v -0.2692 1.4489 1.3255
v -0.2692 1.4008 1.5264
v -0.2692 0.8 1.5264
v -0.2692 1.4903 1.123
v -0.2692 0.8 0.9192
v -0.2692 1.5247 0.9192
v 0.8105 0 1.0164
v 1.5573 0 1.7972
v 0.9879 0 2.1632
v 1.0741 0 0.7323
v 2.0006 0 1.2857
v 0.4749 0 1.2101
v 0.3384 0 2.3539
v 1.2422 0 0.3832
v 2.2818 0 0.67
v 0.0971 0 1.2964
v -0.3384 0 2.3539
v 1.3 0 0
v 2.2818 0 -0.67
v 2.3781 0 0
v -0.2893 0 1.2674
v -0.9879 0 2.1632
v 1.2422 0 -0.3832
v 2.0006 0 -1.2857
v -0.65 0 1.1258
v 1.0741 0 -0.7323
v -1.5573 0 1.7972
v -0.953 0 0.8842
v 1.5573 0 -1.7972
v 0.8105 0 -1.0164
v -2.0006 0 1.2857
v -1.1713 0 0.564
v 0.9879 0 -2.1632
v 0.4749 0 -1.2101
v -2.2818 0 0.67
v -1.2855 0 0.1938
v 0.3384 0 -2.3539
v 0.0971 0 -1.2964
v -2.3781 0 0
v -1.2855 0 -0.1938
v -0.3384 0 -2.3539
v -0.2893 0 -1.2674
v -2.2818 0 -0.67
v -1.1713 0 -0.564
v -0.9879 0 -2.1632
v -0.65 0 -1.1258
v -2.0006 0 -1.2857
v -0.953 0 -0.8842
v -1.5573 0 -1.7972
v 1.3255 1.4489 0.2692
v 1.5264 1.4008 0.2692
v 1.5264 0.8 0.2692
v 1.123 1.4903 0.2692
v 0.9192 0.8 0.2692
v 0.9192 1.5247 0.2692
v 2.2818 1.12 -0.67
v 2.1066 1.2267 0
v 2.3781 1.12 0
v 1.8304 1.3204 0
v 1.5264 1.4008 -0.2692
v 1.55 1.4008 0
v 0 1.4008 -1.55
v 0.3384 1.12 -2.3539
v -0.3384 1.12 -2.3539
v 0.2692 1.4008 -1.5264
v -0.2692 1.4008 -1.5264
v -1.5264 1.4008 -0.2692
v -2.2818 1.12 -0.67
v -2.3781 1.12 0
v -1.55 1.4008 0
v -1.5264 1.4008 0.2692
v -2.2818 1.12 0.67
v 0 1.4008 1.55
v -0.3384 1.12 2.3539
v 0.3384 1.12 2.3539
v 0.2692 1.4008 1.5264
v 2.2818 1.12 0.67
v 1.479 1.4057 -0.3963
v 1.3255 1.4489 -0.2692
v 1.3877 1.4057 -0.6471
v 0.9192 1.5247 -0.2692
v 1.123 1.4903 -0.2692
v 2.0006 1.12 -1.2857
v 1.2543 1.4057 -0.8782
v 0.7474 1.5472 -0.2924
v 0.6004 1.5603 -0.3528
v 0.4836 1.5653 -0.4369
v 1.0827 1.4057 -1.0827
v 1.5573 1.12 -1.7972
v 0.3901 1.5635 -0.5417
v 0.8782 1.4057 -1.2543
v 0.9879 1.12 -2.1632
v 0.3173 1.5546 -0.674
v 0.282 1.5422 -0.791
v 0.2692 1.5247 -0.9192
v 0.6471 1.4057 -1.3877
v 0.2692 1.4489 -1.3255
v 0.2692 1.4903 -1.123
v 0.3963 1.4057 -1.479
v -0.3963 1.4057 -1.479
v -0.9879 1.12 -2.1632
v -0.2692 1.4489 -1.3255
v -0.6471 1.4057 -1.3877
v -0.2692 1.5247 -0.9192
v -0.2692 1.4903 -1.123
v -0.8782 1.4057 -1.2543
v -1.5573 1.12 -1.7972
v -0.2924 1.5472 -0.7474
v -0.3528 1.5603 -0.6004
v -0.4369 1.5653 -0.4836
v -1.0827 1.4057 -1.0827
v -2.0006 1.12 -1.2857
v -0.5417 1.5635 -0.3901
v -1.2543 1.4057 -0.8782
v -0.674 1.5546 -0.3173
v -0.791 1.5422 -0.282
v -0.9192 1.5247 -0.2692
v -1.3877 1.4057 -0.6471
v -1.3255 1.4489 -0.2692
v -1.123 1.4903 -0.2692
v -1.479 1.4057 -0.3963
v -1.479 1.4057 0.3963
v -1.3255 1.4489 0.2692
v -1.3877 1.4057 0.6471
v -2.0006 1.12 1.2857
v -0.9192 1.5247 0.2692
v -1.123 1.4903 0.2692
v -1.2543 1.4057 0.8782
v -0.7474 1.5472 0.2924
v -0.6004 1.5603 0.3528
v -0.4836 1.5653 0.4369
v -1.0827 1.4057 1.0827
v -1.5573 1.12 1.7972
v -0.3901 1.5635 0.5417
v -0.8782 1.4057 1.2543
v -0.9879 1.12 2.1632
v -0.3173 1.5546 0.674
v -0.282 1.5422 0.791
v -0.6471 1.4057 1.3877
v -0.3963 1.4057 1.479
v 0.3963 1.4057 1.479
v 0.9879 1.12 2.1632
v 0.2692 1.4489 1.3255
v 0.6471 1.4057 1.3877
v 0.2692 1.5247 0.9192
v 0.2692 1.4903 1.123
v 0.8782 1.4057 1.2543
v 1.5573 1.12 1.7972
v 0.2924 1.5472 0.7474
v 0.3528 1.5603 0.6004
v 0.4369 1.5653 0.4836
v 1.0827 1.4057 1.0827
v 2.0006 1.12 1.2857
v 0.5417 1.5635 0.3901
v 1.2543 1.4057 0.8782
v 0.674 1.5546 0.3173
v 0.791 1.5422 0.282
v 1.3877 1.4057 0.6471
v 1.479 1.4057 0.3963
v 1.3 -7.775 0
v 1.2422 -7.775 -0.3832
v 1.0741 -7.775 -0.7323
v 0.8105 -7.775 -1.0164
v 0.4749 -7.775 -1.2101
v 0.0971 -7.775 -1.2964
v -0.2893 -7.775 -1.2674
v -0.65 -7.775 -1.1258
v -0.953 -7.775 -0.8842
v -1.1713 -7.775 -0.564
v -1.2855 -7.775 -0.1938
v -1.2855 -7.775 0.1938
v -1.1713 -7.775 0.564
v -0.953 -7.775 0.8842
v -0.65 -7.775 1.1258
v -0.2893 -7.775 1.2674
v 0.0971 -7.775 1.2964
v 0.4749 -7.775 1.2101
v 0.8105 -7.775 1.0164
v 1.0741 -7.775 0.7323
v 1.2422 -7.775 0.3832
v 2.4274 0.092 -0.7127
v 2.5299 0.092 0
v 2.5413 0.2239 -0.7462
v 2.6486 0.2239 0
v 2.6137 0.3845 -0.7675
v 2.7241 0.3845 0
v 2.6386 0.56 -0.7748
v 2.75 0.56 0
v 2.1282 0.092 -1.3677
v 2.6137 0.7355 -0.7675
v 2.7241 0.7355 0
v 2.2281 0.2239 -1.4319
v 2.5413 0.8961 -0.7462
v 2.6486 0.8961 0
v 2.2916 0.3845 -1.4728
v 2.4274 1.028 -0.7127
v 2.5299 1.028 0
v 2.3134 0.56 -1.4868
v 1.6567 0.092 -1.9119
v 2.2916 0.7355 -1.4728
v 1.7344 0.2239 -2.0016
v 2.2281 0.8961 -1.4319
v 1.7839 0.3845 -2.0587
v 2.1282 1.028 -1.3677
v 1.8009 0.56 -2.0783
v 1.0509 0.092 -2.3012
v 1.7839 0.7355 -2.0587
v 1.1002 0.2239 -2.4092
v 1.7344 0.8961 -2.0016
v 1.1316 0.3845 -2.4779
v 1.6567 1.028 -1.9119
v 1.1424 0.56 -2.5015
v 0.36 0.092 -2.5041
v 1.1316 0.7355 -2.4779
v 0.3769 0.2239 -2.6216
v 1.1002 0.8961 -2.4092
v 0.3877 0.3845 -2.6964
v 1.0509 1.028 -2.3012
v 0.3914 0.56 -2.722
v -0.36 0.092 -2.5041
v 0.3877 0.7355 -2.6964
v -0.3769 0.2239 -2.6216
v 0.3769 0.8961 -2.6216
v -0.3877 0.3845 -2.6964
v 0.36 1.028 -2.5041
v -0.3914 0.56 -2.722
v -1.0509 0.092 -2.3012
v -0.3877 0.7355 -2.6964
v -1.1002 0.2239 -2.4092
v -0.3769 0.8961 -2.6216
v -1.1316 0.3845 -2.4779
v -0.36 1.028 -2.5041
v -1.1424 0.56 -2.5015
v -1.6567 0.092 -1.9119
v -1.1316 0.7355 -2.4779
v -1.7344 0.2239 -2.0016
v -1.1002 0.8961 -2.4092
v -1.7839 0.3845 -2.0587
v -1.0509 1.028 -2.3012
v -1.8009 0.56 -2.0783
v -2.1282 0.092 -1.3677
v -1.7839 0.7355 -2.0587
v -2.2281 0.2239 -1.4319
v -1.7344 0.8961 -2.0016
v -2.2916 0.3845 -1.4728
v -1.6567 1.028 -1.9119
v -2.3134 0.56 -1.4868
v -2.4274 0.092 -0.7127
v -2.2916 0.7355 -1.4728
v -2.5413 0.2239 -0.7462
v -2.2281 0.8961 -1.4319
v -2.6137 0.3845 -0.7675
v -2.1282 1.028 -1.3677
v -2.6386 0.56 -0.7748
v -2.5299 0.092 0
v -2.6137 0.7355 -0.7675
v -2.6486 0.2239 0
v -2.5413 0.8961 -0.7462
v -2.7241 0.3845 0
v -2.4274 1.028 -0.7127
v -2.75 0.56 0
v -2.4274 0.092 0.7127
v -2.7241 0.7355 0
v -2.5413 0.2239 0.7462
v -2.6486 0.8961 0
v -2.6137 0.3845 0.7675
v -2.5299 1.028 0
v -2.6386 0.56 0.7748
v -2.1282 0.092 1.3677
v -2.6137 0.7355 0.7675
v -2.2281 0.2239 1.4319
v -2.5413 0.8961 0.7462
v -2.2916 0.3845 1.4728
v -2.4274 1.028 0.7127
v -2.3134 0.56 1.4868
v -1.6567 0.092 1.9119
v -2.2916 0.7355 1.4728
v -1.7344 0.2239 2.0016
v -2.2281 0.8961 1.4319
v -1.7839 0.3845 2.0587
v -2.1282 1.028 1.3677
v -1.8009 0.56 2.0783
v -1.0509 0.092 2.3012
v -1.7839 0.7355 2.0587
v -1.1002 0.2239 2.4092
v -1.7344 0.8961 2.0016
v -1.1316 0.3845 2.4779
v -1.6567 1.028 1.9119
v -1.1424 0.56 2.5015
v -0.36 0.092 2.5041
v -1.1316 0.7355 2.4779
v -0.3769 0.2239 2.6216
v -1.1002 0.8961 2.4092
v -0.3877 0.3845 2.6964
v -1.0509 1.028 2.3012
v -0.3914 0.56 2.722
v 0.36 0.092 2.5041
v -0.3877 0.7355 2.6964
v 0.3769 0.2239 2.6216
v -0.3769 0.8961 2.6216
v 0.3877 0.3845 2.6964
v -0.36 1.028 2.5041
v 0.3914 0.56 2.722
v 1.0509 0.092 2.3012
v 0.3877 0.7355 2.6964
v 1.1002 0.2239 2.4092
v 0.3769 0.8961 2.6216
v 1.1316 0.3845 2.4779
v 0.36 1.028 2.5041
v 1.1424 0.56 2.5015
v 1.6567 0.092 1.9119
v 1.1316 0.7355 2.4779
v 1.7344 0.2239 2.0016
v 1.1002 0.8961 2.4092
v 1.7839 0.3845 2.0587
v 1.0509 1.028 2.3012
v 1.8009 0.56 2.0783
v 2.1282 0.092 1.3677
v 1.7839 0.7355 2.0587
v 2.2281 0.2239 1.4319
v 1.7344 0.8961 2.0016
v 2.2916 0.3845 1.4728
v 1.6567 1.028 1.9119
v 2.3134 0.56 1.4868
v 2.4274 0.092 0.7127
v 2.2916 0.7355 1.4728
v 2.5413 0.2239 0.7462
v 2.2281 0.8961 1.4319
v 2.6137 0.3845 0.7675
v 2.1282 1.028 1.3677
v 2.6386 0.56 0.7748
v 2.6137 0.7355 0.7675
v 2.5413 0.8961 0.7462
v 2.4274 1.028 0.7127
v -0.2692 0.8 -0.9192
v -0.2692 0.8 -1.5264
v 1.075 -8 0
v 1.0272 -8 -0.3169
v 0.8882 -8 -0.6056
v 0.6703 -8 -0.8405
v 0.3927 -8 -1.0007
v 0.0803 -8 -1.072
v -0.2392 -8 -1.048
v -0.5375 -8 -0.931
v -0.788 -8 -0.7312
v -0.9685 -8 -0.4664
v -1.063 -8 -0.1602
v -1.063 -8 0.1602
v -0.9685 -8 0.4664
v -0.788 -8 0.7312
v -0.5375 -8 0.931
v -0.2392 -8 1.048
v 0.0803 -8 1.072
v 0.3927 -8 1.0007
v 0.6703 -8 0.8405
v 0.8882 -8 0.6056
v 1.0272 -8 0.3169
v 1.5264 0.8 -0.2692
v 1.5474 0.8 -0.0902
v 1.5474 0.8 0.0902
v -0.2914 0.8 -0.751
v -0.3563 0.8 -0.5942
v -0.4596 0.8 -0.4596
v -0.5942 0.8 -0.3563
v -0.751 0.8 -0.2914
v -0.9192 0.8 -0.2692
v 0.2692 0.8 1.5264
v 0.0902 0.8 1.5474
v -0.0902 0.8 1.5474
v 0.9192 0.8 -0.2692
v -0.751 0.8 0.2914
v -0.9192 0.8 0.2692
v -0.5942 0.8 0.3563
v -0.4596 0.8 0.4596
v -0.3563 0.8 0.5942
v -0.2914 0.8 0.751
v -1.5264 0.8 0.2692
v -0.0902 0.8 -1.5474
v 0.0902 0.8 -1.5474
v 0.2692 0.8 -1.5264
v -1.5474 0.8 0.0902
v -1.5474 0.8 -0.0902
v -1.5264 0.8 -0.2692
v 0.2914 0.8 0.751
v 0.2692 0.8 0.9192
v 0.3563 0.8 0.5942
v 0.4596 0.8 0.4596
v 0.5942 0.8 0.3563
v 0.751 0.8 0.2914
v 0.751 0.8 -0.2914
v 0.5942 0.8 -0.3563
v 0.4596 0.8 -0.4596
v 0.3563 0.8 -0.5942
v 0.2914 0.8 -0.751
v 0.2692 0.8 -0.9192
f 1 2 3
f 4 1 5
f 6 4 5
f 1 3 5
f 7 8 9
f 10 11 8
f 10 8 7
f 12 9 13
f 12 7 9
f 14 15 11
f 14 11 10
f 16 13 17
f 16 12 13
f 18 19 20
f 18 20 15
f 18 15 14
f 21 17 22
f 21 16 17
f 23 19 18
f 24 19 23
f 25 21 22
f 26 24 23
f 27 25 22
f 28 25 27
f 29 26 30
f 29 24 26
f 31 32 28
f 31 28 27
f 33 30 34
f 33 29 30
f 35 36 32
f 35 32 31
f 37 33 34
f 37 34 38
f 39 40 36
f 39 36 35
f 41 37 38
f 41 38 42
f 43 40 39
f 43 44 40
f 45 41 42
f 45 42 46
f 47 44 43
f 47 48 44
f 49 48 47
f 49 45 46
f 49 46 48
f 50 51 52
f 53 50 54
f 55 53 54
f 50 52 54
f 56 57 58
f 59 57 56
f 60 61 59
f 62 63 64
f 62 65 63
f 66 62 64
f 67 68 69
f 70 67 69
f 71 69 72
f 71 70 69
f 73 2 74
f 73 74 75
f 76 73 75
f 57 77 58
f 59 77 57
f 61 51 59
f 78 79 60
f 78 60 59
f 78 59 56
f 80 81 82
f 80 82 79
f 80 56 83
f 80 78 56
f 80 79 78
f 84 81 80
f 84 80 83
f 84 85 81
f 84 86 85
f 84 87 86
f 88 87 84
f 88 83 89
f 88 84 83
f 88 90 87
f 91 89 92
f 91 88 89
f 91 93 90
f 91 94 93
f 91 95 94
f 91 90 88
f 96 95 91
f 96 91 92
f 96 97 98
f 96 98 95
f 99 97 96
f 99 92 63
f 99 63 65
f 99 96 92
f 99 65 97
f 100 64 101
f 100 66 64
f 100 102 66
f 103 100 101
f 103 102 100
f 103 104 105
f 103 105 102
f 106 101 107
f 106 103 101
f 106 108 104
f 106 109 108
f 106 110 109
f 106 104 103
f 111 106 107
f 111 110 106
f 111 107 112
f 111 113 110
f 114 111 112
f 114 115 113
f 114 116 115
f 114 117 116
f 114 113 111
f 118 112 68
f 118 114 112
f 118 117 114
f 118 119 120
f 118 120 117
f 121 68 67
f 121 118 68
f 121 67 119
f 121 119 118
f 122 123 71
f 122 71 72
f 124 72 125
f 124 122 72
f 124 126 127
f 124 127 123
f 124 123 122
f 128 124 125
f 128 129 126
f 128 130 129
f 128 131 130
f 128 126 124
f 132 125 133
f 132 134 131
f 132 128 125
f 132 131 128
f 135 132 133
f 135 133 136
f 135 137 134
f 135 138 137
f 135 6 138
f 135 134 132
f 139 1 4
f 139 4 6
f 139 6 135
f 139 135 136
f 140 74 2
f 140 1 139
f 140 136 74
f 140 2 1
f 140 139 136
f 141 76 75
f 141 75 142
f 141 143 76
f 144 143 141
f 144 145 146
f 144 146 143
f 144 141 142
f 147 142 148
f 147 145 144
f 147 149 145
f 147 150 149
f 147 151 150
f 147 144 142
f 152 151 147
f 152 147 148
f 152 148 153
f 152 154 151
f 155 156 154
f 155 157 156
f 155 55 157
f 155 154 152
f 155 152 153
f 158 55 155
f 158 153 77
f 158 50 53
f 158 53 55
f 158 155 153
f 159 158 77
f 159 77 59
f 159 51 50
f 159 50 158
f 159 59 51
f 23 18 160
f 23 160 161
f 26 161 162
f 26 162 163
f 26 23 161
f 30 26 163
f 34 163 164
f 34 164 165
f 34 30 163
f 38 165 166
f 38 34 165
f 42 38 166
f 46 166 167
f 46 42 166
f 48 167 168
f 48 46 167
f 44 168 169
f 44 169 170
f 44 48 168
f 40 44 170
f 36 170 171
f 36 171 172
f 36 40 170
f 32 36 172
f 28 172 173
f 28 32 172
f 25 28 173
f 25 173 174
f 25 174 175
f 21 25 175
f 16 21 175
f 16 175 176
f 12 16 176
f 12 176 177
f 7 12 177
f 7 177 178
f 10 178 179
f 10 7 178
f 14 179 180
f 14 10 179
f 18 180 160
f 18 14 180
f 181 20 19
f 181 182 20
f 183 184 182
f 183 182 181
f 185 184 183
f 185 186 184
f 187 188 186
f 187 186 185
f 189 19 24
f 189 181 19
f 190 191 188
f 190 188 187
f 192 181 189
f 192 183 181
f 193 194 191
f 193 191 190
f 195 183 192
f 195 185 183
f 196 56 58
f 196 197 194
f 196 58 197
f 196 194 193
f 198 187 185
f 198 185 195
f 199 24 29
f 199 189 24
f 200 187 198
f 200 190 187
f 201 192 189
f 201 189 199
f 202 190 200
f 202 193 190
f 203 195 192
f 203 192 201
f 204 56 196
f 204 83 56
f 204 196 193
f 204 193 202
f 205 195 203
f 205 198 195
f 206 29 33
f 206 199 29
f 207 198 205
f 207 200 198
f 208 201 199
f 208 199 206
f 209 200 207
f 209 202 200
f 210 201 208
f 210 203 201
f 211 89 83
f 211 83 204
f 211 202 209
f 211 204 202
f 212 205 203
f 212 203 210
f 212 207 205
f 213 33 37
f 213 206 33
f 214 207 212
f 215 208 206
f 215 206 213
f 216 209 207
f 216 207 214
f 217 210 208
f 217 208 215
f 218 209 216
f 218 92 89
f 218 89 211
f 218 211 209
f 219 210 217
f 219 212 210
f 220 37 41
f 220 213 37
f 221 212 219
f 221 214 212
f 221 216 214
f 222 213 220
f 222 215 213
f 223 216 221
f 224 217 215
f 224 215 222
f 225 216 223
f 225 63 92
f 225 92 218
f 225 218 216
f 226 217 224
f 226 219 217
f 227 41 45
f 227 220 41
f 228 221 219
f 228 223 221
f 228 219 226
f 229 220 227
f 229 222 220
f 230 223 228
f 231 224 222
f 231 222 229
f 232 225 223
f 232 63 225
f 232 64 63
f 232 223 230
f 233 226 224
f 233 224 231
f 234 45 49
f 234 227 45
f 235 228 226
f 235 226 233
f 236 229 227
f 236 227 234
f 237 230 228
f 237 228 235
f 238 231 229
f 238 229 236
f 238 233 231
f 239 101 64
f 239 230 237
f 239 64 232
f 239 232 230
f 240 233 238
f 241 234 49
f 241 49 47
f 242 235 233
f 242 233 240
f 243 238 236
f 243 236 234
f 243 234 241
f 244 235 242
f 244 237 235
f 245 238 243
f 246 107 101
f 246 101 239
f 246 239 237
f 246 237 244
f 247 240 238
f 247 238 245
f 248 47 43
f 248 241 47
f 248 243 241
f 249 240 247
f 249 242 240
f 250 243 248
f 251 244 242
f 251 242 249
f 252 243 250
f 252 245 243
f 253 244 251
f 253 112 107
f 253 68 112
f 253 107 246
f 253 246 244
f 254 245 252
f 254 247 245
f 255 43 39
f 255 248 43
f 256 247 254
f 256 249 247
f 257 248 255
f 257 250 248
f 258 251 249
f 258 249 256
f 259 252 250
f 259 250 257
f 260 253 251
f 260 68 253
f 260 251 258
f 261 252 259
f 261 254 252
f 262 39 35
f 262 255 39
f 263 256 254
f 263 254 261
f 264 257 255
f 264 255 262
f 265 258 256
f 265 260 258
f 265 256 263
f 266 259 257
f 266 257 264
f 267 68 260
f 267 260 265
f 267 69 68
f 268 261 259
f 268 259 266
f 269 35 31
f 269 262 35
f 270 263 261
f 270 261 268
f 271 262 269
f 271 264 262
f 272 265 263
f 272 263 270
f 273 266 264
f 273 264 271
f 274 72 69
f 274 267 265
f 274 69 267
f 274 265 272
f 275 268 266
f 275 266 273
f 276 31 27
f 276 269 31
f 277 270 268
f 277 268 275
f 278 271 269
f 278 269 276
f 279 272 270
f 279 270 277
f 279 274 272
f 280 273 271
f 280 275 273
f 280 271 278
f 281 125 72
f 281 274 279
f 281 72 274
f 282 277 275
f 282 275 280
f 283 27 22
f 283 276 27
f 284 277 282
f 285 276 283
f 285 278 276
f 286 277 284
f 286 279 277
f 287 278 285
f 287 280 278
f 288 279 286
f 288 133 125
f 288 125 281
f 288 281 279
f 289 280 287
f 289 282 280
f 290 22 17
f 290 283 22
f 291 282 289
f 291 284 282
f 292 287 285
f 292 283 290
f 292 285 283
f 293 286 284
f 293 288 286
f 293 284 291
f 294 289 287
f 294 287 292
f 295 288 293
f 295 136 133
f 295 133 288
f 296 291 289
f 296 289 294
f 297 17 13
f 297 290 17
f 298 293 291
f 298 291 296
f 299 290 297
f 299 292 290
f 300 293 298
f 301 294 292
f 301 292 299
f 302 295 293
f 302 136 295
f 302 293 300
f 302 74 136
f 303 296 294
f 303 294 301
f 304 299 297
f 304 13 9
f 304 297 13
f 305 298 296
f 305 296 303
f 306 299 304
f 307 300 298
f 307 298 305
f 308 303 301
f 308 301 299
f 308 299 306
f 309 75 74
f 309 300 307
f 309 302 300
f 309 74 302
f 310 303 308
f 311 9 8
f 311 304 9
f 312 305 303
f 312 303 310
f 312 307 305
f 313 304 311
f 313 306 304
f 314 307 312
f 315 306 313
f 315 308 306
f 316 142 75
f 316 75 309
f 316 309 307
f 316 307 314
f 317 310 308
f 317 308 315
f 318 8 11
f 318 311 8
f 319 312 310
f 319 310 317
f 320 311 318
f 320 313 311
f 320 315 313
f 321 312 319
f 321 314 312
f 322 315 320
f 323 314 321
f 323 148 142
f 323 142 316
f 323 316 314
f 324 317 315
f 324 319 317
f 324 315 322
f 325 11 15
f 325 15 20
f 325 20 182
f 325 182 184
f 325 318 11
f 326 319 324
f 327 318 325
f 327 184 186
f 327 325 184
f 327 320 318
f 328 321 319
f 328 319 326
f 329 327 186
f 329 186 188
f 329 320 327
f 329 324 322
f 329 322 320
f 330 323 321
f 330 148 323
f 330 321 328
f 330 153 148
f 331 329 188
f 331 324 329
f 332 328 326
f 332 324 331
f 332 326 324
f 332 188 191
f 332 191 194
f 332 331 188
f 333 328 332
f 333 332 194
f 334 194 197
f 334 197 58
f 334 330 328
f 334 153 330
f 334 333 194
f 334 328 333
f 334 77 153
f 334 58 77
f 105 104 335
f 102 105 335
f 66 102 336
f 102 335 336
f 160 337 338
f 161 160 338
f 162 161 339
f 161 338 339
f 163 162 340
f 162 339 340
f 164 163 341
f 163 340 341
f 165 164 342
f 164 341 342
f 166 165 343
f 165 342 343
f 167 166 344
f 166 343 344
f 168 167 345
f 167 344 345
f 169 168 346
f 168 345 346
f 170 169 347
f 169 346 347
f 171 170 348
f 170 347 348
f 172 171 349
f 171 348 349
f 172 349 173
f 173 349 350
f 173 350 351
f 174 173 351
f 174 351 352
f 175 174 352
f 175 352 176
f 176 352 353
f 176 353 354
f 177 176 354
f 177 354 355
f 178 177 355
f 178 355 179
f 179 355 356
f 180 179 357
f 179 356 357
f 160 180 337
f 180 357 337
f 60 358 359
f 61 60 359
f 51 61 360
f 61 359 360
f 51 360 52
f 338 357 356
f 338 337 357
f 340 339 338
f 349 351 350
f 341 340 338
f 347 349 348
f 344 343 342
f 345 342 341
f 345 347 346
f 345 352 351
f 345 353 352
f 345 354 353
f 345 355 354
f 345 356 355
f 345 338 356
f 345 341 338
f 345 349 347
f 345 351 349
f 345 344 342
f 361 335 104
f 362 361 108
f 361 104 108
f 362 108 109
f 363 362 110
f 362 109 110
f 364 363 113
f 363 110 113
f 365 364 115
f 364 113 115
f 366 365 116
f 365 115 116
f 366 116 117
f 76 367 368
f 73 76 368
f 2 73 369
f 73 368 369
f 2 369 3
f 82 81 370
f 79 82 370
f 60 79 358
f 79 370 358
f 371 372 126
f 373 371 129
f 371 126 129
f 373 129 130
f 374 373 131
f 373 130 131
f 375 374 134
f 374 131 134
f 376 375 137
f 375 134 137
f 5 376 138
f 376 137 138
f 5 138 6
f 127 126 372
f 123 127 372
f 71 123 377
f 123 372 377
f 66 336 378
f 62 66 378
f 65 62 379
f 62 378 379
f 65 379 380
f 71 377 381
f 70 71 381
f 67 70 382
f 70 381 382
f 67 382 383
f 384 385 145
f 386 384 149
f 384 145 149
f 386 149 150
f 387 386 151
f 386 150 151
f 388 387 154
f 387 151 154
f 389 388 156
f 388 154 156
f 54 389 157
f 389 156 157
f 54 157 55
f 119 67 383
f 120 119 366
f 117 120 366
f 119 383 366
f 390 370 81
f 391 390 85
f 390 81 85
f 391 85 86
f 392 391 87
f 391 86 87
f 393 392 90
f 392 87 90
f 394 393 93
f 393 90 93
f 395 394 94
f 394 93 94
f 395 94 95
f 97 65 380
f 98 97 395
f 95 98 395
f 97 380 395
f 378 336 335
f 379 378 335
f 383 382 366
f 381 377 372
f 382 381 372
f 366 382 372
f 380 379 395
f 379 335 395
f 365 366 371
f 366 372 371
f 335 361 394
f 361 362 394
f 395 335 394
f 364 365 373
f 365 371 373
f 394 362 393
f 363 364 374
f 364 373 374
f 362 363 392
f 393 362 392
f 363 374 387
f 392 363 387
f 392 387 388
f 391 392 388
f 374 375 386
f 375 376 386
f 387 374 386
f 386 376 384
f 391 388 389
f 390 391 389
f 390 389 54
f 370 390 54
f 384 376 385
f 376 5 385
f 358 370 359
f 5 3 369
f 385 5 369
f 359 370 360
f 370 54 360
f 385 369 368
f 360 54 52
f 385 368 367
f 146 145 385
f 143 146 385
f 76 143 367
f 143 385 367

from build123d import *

# Parameters (mm, degrees)
CUT_EXTRUDE1_REACH = 11.621
CHAMFER1_SIZE      = 0.225
FILLET1_R          = 0.65


with BuildPart() as part:
    # Boss-Extrude1: read off the stored shape, not the designer's step
    # Boss-Extrude1 outline → Boss-Extrude1 (revolve)
    with BuildSketch(Plane.XY):
        with BuildLine():
            ThreePointArc((2.378097174, 1.12), (1.213027841, 1.478802074), (0, 1.6))
            Line((0, 1.6), (0, -8))
            Line((0, -8), (1.3, -8))
            Line((1.3, -8), (1.3, 0))
            Line((1.3, 0), (2.378097174, 0))
            ThreePointArc((2.378097174, 0), (2.75, 0.56), (2.378097174, 1.12))
        make_face()
    revolve(axis=Axis((0, 0, 0), (0, 1, 0)))

    # Sketch2 → Cut-Extrude1 (cut, up to next)
    with BuildSketch(Plane.XZ.offset(-0.8), mode=Mode.PRIVATE) as cut_extrude1_sk1:
        with BuildLine():
            Line((-0.269238816, 1.526437179), (-0.269238816, 0.269238816))
            Line((-0.269238816, 0.269238816), (-1.526437179, 0.269238816))
            ThreePointArc((-1.526437179, 0.269238816), (-1.55, 0), (-1.526437179, -0.269238816))
            Line((-1.526437179, -0.269238816), (-0.269238816, -0.269238816))
            Line((-0.269238816, -0.269238816), (-0.269238816, -1.526437179))
            ThreePointArc((-0.269238816, -1.526437179), (0, -1.55), (0.269238816, -1.526437179))
            Line((0.269238816, -1.526437179), (0.269238816, -0.269238816))
            Line((0.269238816, -0.269238816), (1.526437179, -0.269238816))
            ThreePointArc((1.526437179, -0.269238816), (1.55, 0), (1.526437179, 0.269238816))
            Line((1.526437179, 0.269238816), (0.269238816, 0.269238816))
            Line((0.269238816, 0.269238816), (0.269238816, 1.526437179))
            ThreePointArc((0.269238816, 1.526437179), (0, 1.55), (-0.269238816, 1.526437179))
        make_face()
    cut_extrude1_tool1 = extrude(cut_extrude1_sk1.sketch, amount=-CUT_EXTRUDE1_REACH, mode=Mode.PRIVATE) & part.part
    add(cut_extrude1_tool1.solids().sort_by_distance((0, 0.8, 0))[0], mode=Mode.SUBTRACT)

    # Chamfer1
    chamfer1_edges = [part.edges().sort_by_distance(p)[0] for p in [
        (-1.3, -8, 0),
    ]]
    chamfer(chamfer1_edges, length=CHAMFER1_SIZE)

    # Fillet1
    fillet1_edges = [part.edges().sort_by_distance(p)[0] for p in [
        (-0.269238816, 1.194082552, 0.269238816),
        (0.269238816, 1.194082552, 0.269238816),
        (-0.269238816, 1.194082552, -0.269238816),
        (0.269238816, 1.194082552, -0.269238816),
    ]]
    fillet(fillet1_edges, radius=FILLET1_R)


solid = part.part
